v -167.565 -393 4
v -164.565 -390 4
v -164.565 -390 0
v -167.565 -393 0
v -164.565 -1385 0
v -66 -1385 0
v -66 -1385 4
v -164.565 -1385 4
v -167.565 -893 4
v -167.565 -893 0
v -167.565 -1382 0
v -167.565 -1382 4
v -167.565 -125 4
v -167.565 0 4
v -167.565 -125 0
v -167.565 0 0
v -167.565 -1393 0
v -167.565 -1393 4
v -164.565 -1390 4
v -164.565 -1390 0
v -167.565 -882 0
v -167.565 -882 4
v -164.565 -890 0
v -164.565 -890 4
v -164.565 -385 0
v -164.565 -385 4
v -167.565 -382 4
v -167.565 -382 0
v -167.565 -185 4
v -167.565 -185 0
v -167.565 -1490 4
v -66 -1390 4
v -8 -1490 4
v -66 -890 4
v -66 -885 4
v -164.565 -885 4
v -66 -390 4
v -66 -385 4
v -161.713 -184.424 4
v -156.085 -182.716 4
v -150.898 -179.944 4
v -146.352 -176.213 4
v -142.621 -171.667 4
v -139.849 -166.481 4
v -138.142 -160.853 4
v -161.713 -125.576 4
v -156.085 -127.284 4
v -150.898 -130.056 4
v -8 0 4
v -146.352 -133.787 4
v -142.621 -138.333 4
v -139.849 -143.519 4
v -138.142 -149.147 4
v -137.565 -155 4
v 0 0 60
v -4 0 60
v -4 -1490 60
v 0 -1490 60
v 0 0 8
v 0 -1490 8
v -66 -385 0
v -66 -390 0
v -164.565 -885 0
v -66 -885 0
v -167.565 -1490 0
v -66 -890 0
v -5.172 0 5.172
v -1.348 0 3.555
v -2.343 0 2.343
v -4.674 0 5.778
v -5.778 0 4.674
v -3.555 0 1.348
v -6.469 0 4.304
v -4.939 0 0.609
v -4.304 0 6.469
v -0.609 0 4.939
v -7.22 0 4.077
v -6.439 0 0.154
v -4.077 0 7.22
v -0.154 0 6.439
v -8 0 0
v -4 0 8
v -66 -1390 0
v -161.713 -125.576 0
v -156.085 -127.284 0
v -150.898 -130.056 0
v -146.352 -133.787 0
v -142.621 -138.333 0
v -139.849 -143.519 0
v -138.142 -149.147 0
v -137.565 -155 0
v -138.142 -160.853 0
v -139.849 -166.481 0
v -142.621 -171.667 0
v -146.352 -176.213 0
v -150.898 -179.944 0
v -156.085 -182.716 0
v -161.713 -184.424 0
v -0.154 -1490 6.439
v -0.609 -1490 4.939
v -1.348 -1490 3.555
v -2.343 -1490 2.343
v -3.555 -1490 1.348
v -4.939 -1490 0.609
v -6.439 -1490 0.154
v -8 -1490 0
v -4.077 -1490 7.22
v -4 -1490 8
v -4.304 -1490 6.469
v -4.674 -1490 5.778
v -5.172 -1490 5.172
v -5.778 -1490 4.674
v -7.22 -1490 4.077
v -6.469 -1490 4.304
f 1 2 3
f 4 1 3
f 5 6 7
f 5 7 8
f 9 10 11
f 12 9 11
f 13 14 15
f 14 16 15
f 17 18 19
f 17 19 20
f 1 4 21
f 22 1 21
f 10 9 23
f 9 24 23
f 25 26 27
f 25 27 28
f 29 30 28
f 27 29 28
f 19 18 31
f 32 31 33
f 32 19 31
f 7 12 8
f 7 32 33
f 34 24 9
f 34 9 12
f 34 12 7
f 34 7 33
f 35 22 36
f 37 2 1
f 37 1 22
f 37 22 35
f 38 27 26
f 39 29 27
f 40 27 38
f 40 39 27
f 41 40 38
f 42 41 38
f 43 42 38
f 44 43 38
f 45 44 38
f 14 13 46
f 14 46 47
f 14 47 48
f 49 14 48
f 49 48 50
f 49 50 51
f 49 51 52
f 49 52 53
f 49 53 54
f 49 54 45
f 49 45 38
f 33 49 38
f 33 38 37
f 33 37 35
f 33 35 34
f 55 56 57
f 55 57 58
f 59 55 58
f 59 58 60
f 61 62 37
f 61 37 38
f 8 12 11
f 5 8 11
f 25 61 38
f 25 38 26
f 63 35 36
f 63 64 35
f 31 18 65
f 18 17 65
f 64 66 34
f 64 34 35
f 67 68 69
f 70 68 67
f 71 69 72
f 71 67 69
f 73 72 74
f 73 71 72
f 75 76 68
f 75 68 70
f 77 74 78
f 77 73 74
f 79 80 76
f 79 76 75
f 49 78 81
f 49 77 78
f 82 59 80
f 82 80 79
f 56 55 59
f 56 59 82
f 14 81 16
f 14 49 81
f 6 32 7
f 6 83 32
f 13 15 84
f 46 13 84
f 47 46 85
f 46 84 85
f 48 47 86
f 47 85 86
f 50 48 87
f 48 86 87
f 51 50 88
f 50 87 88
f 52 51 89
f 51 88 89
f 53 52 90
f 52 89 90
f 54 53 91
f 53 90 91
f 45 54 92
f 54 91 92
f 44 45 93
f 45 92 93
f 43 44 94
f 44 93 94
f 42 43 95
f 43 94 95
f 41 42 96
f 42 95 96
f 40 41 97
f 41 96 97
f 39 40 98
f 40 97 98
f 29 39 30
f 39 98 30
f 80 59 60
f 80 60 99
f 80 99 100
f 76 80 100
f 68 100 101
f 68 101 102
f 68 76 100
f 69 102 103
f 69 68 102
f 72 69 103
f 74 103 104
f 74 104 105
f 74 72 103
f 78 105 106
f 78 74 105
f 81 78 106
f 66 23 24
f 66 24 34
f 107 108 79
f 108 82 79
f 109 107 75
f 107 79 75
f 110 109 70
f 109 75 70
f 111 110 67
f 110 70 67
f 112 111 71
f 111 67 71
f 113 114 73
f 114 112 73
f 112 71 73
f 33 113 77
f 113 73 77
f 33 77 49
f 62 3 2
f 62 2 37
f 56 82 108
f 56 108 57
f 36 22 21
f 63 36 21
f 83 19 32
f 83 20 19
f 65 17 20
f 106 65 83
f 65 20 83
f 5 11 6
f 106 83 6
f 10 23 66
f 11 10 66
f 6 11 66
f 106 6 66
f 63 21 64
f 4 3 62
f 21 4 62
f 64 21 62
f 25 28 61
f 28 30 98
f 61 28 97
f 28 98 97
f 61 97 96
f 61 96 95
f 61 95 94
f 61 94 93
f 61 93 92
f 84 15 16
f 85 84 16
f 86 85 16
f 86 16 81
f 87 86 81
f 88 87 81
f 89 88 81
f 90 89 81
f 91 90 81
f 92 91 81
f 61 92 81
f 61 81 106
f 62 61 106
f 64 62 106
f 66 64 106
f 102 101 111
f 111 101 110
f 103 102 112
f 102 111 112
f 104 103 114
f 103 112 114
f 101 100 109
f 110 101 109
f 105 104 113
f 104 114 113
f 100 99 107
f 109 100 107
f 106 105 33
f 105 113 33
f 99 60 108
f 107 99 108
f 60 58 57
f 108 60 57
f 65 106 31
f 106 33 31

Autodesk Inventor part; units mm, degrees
ref_plane "YZ Plane" through (0, 0, 0) normal (1, 0, 0) x (0, 1, 0)
ref_plane "XZ Plane" through (0, 0, 0) normal (0, 1, 0) x (-1, 0, 0)
ref_plane "XY Plane" through (0, 0, 0) normal (0, 0, 1) x (1, 0, 0)
sketch "Sketch1" plane through (0, 0, 0) normal (0, 0, 1) x (1, 0, 0)
  line L0 (0, 0) -> (-167.5654, 0)
  line L1 (-167.5654, 0) -> (-167.5654, -1490)
  line L2 (-167.5654, -1490) -> (0, -1490)
  line L3 (0, -1490) -> (0, 0)
  line L4 (-167.5654, -1390) -> (-66, -1390)
  line L5 (-66, -1390) -> (-66, -1385)
  line L6 (-66, -1385) -> (-167.5654, -1385)
  line L7 (-167.5654, -1385) -> (-167.5654, -1390)
  line L8 (-167.5654, -890) -> (-66, -890)
  line L9 (-66, -890) -> (-66, -885)
  line L10 (-66, -885) -> (-167.5654, -885)
  line L11 (-167.5654, -885) -> (-167.5654, -890)
  line L12 (-167.5654, -390) -> (-66, -390)
  line L13 (-66, -390) -> (-66, -385)
  line L14 (-66, -385) -> (-167.5654, -385)
  line L15 (-167.5654, -385) -> (-167.5654, -390)
  circle A0 centre (-167.5654, -155) radius 30
  point P0 (-167.5654, -385)
  point P1 (-167.5654, -390)
  point P2 (-167.5654, -885)
  point P3 (-167.5654, -890)
  point P4 (-167.5654, -125)
  point P5 (-167.5654, -185)
  dimension "d0" = 1490
  dimension "d1" = 167.5654
  dimension "d2" = 5
  dimension "d4" = 100
  dimension "d7" = 500
  dimension "d23" = 66
  dimension "d28" = 60
  dimension "d29" = 1335
extrude "Plate1" add sketch "Sketch1" along normal blind 4 contours L3 L2 L1 L4 L5 L6 L8 L9 L10 L12 L13 L14 A0 L0
sketch "Sketch2" plane through (-4, 0, 0) normal (1, 0, 0) x (0, 1, 0)
  line L0 (-1490, 0) -> (0, 0)
  line L1 (0, 0) -> (0, 60)
  line L2 (0, 60) -> (-1490, 60)
  line L3 (-1490, 60) -> (-1490, 0)
edge flange "Flange1" height 60 angle 90 thickness 4 bend radius 4 thickness toward (1, 0, 0) relief tear relief width 4 relief depth 2 edges at (0, -745, 4) wall of the first edge with corners at (-4, -1490, 0) (-4, 0, 0) (-4, 0, 60) (-4, -1490, 60)
bend "Bend1"
corner "Corner1"
chamfer "Corner Chamfer1" distance 3 angle 45 6 edges at (-167.5654, -1390, 2) (-167.5654, -1385, 2) (-167.5654, -890, 2) (-167.5654, -885, 2) (-167.5654, -385, 2) (-167.5654, -390, 2)
equation "\"d0\" = Стрингер_длина"
equation "\"d1\" = стрингер_глубина_3"
equation "\"d2\" = паз_под_стрингер_толщина"
equation "\"d23\" = паз_под_стрингер_глубина - Thickness"
equation "\"d28\" = 2 * радиус_выреза_под_сварку"
equation "\"d12\" = Thickness"
equation "\"d13\" = BendReliefWidth"
equation "\"d14\" = BendReliefDepth"
equation "\"d15\" = MinimumRemnant"
equation "\"d16\" = TransitionRadius"
equation "\"d17\" = ребро_усилителей"
equation "\"d19\" = BendRadius"
equation "\"d20\" = CornerReliefSize"
equation "\"d21\" = GapSize"
equation "\"d22\" = JacobiRadiusSize"
equation "\"BendRadius\" = Thickness"
equation "\"BendReliefWidth\" = Thickness"
equation "\"BendReliefDepth\" = 0.5 * Thickness"
equation "\"CornerReliefSize\" = 4 * Thickness"
equation "\"MinimumRemnant\" = 2 * Thickness"
equation "\"TransitionRadius\" = BendRadius"
equation "\"JacobiRadiusSize\" = BendRadius"
equation "\"GapSize\" = Thickness"
equation "\"Стрингер_длина\" = 1490"
equation "\"стрингер_глубина_3\" = 167.565356"
equation "\"паз_под_стрингер_толщина\" = 5"
equation "\"паз_под_стрингер_глубина\" = 70"
equation "\"Thickness\" = 4"
equation "\"радиус_выреза_под_сварку\" = 30"
equation "\"ребро_усилителей\" = 60"
properties part number "0236 GBK stringer 3" material "Steel"
